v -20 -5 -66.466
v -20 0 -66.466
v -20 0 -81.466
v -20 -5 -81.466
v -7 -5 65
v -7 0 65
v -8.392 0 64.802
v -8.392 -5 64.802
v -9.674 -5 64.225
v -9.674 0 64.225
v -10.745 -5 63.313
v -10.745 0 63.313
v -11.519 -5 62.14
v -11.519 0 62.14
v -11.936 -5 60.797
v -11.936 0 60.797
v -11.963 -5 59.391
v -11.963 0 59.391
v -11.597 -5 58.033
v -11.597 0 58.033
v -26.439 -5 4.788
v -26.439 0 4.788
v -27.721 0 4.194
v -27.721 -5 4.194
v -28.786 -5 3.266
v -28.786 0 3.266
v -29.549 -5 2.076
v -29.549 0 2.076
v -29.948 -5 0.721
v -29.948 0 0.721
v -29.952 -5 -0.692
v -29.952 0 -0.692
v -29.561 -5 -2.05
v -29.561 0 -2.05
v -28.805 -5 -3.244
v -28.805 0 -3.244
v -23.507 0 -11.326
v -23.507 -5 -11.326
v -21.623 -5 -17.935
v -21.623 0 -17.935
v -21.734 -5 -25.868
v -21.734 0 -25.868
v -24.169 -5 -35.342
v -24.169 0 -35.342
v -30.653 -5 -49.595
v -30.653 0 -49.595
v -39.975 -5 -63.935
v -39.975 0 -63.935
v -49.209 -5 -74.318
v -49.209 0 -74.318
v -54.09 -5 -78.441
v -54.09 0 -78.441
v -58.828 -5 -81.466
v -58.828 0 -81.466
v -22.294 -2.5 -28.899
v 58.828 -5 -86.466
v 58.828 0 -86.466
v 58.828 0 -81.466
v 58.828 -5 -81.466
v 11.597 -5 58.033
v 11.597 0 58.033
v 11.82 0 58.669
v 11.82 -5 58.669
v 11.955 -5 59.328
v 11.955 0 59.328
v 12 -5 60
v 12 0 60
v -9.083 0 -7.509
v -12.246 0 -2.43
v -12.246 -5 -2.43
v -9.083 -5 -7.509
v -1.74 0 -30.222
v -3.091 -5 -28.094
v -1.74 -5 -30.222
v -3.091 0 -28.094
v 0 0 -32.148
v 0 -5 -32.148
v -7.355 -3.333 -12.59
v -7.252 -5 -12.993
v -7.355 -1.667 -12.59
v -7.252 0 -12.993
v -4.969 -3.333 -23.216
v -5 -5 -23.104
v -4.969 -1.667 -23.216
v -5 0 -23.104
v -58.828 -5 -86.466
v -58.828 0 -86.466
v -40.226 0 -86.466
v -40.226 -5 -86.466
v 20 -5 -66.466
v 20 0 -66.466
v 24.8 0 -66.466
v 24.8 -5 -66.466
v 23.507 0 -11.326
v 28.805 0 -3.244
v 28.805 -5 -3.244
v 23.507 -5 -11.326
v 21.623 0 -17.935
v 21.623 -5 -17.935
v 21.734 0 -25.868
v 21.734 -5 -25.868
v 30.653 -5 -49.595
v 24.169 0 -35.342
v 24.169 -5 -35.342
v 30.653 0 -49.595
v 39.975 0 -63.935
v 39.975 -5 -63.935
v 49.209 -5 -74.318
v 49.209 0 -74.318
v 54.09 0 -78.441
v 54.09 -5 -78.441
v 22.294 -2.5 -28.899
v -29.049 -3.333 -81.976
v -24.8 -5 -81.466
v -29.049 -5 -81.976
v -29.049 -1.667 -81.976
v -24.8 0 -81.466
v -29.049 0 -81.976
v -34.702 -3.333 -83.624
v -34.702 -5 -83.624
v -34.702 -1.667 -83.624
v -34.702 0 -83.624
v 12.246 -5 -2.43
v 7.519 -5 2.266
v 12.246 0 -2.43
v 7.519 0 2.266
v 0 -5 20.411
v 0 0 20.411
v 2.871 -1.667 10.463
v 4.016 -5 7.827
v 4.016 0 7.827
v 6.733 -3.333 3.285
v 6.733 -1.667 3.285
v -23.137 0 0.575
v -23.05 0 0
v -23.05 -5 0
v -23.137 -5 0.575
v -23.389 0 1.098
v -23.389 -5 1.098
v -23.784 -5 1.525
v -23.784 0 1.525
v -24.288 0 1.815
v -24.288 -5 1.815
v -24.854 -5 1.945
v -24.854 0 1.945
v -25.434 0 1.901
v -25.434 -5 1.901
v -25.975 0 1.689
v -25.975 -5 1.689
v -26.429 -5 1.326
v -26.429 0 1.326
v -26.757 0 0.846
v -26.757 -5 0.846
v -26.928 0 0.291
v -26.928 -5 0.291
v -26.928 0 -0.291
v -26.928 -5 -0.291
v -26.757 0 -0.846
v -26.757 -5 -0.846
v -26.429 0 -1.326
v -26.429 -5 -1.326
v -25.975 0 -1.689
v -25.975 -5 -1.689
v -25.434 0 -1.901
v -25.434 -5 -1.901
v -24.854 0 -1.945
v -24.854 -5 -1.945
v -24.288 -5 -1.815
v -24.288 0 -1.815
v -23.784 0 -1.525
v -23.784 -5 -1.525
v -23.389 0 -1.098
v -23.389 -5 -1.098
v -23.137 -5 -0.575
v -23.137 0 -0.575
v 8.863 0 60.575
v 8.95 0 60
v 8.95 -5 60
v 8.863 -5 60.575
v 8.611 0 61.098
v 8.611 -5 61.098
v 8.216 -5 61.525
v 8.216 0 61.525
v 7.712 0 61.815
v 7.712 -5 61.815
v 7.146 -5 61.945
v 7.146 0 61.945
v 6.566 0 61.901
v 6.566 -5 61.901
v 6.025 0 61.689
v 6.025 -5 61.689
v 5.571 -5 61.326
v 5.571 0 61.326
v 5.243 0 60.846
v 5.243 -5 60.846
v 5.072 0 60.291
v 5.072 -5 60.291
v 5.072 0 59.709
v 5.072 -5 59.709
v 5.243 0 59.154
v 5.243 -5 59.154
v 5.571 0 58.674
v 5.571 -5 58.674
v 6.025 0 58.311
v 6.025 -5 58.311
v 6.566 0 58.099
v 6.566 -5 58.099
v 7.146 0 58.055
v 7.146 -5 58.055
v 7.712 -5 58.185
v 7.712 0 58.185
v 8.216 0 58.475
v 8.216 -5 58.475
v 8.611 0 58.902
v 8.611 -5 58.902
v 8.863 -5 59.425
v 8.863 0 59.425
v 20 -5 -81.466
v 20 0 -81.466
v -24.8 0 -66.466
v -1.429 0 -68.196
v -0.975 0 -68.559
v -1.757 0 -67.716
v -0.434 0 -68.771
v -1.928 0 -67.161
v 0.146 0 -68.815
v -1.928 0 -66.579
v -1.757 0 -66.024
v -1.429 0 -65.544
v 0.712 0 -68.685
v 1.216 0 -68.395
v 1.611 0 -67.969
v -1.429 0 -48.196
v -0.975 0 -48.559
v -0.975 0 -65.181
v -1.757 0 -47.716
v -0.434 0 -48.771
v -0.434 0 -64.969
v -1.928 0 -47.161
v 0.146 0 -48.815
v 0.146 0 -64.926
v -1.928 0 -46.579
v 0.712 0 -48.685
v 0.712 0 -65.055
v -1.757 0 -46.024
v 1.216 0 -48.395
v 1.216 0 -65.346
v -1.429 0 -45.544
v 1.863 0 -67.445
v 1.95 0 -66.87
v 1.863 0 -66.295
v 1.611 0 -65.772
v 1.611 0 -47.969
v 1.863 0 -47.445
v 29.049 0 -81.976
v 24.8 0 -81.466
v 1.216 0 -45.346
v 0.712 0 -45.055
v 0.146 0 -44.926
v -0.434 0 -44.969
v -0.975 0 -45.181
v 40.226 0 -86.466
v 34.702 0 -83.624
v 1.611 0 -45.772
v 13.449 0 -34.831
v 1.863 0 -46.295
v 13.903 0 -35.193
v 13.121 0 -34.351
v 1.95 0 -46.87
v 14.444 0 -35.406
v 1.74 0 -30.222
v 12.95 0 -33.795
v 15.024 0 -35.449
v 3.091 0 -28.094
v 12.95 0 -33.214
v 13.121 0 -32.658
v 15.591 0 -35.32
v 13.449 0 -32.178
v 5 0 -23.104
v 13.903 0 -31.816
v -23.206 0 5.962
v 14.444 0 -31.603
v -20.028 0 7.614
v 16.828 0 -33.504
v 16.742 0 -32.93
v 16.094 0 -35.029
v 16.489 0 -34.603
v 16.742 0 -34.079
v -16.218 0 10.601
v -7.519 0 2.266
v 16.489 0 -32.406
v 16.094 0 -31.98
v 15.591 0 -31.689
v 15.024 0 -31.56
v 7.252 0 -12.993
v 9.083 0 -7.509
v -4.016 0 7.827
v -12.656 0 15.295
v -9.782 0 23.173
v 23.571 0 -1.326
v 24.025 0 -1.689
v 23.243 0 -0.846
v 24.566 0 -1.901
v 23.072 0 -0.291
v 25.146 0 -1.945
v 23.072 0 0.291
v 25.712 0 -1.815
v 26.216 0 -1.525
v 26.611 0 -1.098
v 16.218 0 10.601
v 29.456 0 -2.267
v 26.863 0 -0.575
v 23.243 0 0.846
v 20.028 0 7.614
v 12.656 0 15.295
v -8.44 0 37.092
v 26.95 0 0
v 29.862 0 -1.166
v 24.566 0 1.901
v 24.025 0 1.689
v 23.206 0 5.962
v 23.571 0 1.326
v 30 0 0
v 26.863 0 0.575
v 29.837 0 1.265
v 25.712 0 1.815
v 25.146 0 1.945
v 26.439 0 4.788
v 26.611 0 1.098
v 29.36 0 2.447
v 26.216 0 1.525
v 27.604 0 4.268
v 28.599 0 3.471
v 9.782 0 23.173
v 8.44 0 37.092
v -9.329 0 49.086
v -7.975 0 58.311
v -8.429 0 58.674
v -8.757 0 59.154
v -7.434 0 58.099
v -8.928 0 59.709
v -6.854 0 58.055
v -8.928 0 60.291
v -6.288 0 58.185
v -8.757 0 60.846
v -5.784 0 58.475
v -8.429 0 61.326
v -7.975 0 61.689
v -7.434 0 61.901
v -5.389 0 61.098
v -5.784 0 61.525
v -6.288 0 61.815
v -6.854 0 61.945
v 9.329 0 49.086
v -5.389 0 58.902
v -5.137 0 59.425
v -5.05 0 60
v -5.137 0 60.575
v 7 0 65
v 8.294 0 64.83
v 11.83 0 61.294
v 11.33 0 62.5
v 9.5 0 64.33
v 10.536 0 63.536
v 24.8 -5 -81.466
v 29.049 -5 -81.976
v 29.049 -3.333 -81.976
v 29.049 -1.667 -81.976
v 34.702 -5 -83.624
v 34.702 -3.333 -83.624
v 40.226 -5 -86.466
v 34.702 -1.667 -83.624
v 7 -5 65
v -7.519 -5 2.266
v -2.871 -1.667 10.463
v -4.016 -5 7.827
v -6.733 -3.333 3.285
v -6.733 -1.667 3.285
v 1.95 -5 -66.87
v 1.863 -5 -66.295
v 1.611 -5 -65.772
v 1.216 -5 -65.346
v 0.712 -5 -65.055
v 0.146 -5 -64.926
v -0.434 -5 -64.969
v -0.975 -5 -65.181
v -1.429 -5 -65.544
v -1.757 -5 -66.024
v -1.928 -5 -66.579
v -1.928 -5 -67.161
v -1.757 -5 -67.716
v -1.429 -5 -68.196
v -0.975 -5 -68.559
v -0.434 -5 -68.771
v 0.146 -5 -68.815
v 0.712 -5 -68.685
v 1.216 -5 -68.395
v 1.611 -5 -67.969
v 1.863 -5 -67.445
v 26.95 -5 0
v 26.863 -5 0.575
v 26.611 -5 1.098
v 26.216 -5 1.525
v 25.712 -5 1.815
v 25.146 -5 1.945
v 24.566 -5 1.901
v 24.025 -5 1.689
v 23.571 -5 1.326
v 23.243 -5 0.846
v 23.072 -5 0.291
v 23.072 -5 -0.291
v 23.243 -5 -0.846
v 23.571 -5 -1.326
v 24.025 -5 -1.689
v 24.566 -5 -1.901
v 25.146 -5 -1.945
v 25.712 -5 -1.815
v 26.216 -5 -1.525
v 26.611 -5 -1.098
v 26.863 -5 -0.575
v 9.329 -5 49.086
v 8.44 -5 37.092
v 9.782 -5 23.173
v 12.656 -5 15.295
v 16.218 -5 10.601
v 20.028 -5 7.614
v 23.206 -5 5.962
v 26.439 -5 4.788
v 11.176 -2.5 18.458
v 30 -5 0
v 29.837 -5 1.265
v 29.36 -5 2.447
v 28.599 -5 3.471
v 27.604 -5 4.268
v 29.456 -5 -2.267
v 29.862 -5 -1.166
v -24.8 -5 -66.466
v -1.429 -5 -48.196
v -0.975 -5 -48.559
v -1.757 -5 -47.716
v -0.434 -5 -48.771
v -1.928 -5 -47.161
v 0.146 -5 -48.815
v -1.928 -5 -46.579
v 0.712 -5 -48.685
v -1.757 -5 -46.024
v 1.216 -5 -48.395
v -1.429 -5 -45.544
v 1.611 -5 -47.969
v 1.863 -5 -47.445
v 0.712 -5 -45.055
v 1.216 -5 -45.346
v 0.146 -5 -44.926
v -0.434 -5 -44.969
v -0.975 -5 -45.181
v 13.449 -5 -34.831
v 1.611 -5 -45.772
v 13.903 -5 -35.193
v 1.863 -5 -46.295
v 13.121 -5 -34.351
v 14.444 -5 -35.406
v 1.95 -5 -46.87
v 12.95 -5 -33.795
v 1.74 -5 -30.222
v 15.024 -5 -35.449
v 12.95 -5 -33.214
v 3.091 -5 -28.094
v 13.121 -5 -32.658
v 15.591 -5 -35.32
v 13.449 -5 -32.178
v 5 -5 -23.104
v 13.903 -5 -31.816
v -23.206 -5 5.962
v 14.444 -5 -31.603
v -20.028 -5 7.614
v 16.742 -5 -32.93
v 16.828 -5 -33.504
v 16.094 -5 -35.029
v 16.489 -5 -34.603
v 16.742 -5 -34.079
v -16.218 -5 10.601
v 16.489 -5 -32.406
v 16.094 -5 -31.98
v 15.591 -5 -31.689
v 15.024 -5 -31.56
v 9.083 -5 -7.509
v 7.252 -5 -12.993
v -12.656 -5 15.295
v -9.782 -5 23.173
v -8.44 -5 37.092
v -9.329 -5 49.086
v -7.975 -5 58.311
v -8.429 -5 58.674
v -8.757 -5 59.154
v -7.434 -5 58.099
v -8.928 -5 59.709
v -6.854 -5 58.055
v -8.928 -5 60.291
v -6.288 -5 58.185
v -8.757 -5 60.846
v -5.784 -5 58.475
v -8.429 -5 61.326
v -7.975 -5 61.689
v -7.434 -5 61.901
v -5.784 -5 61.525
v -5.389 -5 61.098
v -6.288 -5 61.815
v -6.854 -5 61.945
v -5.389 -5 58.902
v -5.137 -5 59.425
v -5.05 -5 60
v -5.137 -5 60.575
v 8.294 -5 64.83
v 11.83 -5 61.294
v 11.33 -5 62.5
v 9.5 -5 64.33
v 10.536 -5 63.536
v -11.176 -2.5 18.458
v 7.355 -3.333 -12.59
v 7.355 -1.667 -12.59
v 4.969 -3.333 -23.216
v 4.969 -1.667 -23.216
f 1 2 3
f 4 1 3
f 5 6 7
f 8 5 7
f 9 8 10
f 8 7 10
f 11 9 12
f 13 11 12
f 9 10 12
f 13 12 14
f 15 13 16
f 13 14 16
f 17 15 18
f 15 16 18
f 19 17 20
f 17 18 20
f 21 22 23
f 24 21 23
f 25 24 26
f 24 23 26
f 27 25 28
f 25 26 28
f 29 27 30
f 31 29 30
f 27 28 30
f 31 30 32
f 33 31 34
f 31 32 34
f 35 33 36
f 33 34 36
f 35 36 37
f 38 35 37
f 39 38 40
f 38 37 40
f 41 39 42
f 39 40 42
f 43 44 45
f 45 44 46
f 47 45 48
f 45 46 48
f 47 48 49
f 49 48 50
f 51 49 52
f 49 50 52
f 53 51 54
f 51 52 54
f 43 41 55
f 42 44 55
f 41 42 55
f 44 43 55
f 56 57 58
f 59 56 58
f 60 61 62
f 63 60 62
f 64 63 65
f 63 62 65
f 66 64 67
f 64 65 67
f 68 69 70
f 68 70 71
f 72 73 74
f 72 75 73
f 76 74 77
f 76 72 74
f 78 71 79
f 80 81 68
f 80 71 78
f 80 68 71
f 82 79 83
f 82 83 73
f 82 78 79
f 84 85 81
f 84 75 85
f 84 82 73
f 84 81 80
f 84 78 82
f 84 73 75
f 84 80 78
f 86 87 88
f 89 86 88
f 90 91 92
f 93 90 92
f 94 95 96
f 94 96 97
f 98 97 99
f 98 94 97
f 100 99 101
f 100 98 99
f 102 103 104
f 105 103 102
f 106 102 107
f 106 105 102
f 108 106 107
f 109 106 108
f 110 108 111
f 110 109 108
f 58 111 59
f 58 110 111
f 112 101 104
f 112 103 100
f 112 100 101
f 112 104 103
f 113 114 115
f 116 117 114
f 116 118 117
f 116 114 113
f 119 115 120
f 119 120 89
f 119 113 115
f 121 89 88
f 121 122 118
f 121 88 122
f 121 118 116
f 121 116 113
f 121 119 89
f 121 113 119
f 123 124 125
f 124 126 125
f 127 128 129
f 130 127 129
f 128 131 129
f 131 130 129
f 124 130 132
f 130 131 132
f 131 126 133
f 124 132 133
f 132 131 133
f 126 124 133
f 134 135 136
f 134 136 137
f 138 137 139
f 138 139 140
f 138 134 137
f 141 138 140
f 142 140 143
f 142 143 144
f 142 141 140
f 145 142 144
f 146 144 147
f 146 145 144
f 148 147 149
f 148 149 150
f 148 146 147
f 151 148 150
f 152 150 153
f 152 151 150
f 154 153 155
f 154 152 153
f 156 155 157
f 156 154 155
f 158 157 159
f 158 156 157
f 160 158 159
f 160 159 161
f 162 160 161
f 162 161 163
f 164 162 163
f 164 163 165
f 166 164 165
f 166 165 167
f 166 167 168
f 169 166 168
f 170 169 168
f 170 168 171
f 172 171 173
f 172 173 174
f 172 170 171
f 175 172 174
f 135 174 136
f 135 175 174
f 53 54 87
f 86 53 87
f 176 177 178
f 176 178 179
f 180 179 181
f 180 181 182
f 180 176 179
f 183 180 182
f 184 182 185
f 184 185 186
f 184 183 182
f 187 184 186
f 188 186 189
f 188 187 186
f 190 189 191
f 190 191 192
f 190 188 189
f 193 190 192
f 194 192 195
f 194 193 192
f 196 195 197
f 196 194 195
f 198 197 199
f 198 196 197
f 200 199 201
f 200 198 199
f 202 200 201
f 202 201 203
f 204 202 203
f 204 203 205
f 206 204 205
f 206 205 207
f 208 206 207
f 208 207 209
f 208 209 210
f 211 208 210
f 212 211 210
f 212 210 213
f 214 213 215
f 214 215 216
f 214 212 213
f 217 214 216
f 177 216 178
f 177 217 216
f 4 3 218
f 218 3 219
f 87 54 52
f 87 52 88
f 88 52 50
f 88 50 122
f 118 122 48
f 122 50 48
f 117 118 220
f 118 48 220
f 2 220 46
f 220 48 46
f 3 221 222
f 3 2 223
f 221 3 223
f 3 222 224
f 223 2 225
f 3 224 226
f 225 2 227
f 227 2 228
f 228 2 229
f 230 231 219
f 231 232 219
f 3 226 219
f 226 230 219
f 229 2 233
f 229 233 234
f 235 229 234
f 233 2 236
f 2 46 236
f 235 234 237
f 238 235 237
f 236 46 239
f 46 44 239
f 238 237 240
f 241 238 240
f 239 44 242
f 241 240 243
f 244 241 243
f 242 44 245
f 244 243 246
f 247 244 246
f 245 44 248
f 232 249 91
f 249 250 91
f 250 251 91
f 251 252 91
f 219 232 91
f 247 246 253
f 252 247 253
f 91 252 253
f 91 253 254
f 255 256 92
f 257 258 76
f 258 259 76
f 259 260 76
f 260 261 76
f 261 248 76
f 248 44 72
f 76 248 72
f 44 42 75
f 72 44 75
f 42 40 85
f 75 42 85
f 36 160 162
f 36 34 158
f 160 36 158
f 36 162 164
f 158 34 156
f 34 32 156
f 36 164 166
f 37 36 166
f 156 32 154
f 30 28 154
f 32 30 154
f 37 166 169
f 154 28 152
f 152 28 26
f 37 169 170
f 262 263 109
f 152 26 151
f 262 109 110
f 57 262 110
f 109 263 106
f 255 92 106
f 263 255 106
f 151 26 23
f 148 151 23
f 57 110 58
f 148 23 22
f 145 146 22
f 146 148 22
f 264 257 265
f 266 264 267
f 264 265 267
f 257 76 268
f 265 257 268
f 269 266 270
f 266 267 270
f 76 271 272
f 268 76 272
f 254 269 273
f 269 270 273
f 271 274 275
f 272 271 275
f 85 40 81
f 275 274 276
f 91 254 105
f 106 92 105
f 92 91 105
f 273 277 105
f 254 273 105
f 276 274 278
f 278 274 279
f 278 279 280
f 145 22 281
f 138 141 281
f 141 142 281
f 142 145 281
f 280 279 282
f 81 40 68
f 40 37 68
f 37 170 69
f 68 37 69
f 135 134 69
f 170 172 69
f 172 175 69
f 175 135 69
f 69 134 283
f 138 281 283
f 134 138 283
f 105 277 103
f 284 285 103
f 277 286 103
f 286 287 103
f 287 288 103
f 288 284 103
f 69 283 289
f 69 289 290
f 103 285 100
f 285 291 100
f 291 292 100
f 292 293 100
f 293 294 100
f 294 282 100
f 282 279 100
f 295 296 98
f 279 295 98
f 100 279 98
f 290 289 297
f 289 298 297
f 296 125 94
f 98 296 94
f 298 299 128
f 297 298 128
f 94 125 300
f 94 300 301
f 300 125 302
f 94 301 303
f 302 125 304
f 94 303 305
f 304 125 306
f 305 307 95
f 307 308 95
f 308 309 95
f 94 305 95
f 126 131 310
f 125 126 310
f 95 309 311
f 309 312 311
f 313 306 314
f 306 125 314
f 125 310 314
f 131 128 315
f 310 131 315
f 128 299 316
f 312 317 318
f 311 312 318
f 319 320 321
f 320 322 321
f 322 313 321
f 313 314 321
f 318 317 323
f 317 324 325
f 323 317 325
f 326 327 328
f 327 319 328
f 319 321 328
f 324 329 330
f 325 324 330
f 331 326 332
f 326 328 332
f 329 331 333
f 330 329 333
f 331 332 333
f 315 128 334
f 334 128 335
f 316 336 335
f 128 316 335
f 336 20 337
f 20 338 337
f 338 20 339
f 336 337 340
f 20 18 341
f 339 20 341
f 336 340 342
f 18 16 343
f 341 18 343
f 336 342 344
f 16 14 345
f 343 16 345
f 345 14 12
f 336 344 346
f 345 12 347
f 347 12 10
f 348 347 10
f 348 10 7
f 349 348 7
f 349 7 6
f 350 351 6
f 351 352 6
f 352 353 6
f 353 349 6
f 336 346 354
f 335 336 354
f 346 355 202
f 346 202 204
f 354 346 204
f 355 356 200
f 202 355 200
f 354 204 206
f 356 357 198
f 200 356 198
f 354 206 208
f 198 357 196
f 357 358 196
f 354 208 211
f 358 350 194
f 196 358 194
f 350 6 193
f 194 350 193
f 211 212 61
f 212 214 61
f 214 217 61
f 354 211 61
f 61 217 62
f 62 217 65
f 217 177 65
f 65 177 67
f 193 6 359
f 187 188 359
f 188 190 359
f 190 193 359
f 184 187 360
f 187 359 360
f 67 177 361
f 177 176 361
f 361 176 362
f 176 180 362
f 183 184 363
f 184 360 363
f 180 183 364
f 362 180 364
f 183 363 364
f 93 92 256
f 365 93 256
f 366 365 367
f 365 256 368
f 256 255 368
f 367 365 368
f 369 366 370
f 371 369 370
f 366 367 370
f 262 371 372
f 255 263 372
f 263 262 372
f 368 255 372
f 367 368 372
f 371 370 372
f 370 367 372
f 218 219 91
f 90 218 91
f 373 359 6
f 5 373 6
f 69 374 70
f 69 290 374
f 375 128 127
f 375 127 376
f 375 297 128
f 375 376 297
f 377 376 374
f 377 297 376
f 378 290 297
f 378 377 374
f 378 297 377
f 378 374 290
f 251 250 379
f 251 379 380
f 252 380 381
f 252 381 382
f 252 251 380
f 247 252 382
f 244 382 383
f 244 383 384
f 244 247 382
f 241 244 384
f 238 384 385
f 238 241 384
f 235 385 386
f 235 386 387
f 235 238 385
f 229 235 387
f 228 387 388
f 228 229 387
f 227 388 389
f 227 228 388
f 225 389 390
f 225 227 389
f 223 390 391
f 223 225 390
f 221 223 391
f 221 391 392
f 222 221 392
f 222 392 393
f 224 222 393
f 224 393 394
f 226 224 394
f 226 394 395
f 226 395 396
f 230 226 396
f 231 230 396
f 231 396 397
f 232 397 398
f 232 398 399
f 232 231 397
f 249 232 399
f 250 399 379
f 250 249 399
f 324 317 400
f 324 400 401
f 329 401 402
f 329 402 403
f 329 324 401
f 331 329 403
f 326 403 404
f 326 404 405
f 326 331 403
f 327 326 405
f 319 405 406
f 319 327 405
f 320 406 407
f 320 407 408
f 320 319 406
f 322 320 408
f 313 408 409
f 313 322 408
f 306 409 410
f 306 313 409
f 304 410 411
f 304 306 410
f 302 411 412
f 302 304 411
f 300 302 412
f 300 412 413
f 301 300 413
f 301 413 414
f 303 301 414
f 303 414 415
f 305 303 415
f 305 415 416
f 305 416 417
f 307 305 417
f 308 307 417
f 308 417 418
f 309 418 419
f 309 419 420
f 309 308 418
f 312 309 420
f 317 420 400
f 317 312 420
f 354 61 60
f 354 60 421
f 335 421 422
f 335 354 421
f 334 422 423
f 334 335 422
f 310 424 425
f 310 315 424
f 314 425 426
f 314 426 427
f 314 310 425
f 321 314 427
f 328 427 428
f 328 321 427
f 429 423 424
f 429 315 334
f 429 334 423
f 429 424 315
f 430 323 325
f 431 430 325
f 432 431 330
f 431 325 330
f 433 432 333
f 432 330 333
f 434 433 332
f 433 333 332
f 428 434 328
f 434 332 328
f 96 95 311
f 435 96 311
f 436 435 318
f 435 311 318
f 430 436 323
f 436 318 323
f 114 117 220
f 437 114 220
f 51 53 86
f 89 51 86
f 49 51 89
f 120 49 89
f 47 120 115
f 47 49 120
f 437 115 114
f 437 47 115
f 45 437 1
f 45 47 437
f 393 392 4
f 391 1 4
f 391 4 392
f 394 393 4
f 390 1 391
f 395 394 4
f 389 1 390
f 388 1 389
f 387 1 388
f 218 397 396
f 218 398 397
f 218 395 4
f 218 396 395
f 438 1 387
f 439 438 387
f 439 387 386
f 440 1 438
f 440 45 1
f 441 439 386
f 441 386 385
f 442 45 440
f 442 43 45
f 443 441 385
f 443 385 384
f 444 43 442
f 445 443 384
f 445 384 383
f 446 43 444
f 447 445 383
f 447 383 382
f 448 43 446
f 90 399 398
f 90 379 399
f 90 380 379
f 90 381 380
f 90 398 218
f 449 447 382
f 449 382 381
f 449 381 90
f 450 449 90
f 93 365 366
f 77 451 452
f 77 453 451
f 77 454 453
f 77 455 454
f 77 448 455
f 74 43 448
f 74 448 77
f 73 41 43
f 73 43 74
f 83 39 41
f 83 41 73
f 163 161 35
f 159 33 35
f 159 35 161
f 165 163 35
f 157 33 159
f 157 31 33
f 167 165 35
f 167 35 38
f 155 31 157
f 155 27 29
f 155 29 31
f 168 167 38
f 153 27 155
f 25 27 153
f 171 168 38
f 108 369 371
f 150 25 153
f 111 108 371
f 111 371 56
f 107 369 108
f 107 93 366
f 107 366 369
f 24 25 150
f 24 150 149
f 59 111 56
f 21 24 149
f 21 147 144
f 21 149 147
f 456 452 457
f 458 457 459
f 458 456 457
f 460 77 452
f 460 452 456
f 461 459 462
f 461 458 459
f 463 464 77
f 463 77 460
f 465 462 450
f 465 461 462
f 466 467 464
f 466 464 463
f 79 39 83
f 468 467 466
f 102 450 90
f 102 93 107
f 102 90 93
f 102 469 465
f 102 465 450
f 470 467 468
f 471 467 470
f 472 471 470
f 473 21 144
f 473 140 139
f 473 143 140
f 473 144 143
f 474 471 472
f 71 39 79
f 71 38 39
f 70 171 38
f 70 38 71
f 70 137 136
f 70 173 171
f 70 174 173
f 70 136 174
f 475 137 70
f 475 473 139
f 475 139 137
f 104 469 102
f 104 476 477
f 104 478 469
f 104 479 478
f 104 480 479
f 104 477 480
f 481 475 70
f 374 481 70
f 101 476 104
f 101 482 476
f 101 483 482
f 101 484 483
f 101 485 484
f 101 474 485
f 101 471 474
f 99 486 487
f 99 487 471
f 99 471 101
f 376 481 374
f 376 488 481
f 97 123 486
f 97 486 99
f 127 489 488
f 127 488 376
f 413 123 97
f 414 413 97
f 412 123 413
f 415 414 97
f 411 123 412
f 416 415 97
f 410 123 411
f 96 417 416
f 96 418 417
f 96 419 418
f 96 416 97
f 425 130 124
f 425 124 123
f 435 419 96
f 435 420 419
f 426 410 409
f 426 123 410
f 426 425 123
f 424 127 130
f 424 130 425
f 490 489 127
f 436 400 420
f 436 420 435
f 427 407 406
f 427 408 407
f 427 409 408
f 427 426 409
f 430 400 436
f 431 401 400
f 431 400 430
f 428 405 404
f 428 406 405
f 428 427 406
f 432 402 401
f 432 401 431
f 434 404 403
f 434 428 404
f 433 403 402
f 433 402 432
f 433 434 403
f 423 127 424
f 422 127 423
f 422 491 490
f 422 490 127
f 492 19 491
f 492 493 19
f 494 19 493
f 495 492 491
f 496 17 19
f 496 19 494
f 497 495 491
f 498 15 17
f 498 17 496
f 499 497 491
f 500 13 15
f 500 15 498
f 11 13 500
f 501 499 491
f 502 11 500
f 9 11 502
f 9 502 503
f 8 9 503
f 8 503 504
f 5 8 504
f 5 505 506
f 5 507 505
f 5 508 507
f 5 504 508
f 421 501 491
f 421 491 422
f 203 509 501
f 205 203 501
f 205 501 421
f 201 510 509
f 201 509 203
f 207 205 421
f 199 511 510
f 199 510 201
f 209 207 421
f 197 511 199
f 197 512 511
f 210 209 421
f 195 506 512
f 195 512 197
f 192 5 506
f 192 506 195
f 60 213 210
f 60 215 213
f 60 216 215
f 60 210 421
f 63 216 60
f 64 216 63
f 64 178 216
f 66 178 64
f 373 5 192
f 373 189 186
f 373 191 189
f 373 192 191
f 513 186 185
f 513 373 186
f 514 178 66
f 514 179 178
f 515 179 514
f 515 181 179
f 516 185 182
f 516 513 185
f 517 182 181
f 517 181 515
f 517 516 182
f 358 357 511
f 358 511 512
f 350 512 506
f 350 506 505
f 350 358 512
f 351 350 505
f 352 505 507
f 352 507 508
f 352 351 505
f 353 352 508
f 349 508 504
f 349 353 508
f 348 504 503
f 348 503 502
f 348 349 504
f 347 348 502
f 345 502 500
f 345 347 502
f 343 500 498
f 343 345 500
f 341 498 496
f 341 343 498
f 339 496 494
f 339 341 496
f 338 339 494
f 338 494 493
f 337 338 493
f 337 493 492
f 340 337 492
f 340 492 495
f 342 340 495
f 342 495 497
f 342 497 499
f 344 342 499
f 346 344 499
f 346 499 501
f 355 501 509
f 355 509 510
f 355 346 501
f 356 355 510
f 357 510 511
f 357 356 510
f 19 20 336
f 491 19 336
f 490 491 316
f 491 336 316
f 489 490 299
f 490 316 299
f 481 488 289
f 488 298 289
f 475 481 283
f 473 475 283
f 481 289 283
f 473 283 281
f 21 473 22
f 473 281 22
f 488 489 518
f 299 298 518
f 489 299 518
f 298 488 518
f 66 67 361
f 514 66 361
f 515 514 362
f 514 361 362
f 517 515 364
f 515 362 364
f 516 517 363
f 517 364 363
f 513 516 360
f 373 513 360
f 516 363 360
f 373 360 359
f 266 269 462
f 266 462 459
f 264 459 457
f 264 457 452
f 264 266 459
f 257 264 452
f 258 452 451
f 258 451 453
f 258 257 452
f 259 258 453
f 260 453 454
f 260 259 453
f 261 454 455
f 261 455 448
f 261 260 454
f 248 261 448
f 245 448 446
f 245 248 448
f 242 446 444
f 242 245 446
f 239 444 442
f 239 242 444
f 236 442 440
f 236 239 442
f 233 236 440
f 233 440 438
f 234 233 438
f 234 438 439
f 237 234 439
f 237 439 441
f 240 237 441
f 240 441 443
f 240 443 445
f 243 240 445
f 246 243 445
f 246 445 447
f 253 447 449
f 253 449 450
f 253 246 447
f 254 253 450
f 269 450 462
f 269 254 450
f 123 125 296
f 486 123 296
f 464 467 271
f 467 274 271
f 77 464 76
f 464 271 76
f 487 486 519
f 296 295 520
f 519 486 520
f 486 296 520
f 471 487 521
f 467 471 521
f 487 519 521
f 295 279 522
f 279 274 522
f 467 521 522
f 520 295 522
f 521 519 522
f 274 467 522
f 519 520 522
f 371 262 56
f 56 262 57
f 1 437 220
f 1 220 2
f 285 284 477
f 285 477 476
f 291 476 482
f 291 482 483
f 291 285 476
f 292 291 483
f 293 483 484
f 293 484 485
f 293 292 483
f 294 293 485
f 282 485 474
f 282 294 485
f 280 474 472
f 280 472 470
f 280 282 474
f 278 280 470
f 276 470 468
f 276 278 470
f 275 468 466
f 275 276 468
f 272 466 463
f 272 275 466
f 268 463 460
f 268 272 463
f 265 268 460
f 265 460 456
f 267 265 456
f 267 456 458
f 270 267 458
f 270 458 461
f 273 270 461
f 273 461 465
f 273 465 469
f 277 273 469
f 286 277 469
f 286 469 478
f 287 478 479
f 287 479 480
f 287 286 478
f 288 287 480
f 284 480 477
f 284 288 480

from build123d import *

# Parameters (mm, degrees)
F0_R     = 1.95
F1_DEPTH = 5


with BuildPart() as f1:
    # F0 (on Front) → F1 (new body)
    with BuildSketch(Plane.XZ):
        with BuildLine():
            ThreePointArc((11.5969807084, 58.0333357261), (11.8982090371, 58.9962329808), (12, 60))
            ThreePointArc((12, 60), (10.5355339059, 63.5355339059), (7, 65))
            ThreePointArc((7, 65), (2.8266727082, 57.2462136402), (11.5969807084, 58.0333357261))
        make_face()
        with Locations((7, 60)):
            Circle(F0_R, mode=Mode.SUBTRACT)
        with BuildLine():
            ThreePointArc((11.5969807084, 58.0333357261), (2.8266727082, 57.2462136402), (7, 65))
            Line((7, 65), (0, 65))
            Line((0, 65), (-7, 65))
            ThreePointArc((-7, 65), (-3.4644660941, 63.5355339059), (-2, 60))
            ThreePointArc((-2, 60), (-5.9962329808, 55.1017909629), (-11.5969807084, 58.0333357261))
            add(Edge.make_bspline(
                [(-11.5969807084, 58.0333357261), (-8.259178384, 50.2313874739), (-5.7002681923, 15.299773588), (-20.5659226075, 6.5540384245), (-26.4394786751, 4.7883087979)],
                knots=[0, 0, 0, 0, 0.5815539161, 1, 1, 1, 1], degree=3))
            ThreePointArc((-26.4394786751, 4.7883087979), (-22.0164947943, 4.0123181189), (-20, 0))
            ThreePointArc((-20, 0), (-23.271638205, -4.69177637), (-28.8051062023, -3.2436348113))
            add(Edge.make_bspline(
                [(-28.8051062023, -3.2436348113), (-22.7247010924, -10.376554681), (-15.2262960098, -29.050287314), (-43.232798529, -73.227558015), (-58.8278773565, -81.4663794637)],
                knots=[0, 0, 0, 0, 0.3913654049, 1, 1, 1, 1], degree=3))
            Line((-58.8278773565, -81.4663794637), (-58.8278773565, -86.4663794637))
            Line((-58.8278773565, -86.4663794637), (-40.2264967561, -86.4663794637))
            add(Edge.make_bspline(
                [(-24.8, -81.4663794637), (-27.8363596976, -81.4270702004), (-35.2759175003, -83.0063000321), (-40.2264967561, -86.4663794637)],
                knots=[0, 0, 0, 0, 16.2165595046, 16.2165595046, 16.2165595046, 16.2165595046], degree=3))
            Line((-24.8, -81.4663794637), (-24.8, -66.4663794637))
            Line((-24.8, -66.4663794637), (-20, -66.4663794637))
            Line((-20, -66.4663794637), (-20, -81.4663794637))
            Line((-20, -81.4663794637), (0, -81.4663794637))
            Line((0, -81.4663794637), (20, -81.4663794637))
            Line((20, -81.4663794637), (20, -66.4663794637))
            Line((20, -66.4663794637), (24.8, -66.4663794637))
            Line((24.8, -66.4663794637), (24.8, -81.4663794637))
            add(Edge.make_bspline(
                [(24.8, -81.4663794637), (27.8363596976, -81.4270702004), (35.2759175003, -83.0063000321), (40.2264967561, -86.4663794637)],
                knots=[0, 0, 0, 0, 16.2165595046, 16.2165595046, 16.2165595046, 16.2165595046], degree=3))
            Line((40.2264967561, -86.4663794637), (58.8278773565, -86.4663794637))
            Line((58.8278773565, -86.4663794637), (58.8278773565, -81.4663794637))
            add(Edge.make_bspline(
                [(28.8051062023, -3.2436348113), (22.7247010924, -10.376554681), (15.2262960098, -29.050287314), (43.232798529, -73.227558015), (58.8278773565, -81.4663794637)],
                knots=[0, 0, 0, 0, 0.3913654049, 1, 1, 1, 1], degree=3))
            ThreePointArc((28.8051062023, -3.2436348113), (20.2037048496, -1.4126403755), (26.4394786751, 4.7883087979))
            add(Edge.make_bspline(
                [(11.5969807084, 58.0333357261), (8.259178384, 50.2313874739), (5.7002681923, 15.299773588), (20.5659226075, 6.5540384245), (26.4394786751, 4.7883087979)],
                knots=[0, 0, 0, 0, 0.5815539161, 1, 1, 1, 1], degree=3))
        make_face()
        with Locations((0, -66.8700714409)):
            Circle(F0_R, mode=Mode.SUBTRACT)
        with Locations((0, -46.8700714409)):
            Circle(F0_R, mode=Mode.SUBTRACT)
        with Locations((14.8781873236, -33.5044610186)):
            Circle(F0_R, mode=Mode.SUBTRACT)
        with BuildLine():
            add(Edge.make_bspline(
                [(0, 20.4110946506), (-2.5965298992, 8.6431102827), (-5.6864479557, 2.9892178718), (-12.2460462153, -2.4297779892)],
                knots=[0, 0, 0, 0, 25.9166184302, 25.9166184302, 25.9166184302, 25.9166184302], degree=3))
            add(Edge.make_bspline(
                [(0, 20.4110946506), (2.5965298992, 8.6431102827), (5.6864479557, 2.9892178718), (12.2460462153, -2.4297779892)],
                knots=[0, 0, 0, 0, 25.9166184302, 25.9166184302, 25.9166184302, 25.9166184302], degree=3))
            add(Edge.make_bspline(
                [(12.2460462153, -2.4297779892), (4.406365566, -11.6358492523), (7.9564843327, -24.7844345868), (0, -32.1476459503)],
                knots=[0, 0, 0, 0, 32.1421424934, 32.1421424934, 32.1421424934, 32.1421424934], degree=3))
            add(Edge.make_bspline(
                [(-12.2460462153, -2.4297779892), (-4.406365566, -11.6358492523), (-7.9564843327, -24.7844345868), (0, -32.1476459503)],
                knots=[0, 0, 0, 0, 32.1421424934, 32.1421424934, 32.1421424934, 32.1421424934], degree=3))
        make_face(mode=Mode.SUBTRACT)
        with BuildLine():
            ThreePointArc((30, 0), (29.0123181189, 2.9835052057), (26.4394786751, 4.7883087979))
            ThreePointArc((26.4394786751, 4.7883087979), (20.2037048496, -1.4126403755), (28.8051062023, -3.2436348113))
            ThreePointArc((28.8051062023, -3.2436348113), (29.69177637, -1.728361795), (30, 0))
        make_face()
        with Locations((25, 0)):
            Circle(F0_R, mode=Mode.SUBTRACT)
        with BuildLine():
            ThreePointArc((-2, 60), (-3.4644660941, 63.5355339059), (-7, 65))
            ThreePointArc((-7, 65), (-11.1733272918, 62.7537863598), (-11.5969807084, 58.0333357261))
            ThreePointArc((-11.5969807084, 58.0333357261), (-5.9962329808, 55.1017909629), (-2, 60))
        make_face()
        with Locations((-7, 60)):
            Circle(F0_R, mode=Mode.SUBTRACT)
        with BuildLine():
            ThreePointArc((-20, 0), (-22.0164947943, 4.0123181189), (-26.4394786751, 4.7883087979))
            ThreePointArc((-26.4394786751, 4.7883087979), (-29.7962951504, 1.4126403755), (-28.8051062023, -3.2436348113))
            ThreePointArc((-28.8051062023, -3.2436348113), (-23.271638205, -4.69177637), (-20, 0))
        make_face()
        with Locations((-25, 0)):
            Circle(F0_R, mode=Mode.SUBTRACT)
    extrude(amount=F1_DEPTH)


solid = f1.part
